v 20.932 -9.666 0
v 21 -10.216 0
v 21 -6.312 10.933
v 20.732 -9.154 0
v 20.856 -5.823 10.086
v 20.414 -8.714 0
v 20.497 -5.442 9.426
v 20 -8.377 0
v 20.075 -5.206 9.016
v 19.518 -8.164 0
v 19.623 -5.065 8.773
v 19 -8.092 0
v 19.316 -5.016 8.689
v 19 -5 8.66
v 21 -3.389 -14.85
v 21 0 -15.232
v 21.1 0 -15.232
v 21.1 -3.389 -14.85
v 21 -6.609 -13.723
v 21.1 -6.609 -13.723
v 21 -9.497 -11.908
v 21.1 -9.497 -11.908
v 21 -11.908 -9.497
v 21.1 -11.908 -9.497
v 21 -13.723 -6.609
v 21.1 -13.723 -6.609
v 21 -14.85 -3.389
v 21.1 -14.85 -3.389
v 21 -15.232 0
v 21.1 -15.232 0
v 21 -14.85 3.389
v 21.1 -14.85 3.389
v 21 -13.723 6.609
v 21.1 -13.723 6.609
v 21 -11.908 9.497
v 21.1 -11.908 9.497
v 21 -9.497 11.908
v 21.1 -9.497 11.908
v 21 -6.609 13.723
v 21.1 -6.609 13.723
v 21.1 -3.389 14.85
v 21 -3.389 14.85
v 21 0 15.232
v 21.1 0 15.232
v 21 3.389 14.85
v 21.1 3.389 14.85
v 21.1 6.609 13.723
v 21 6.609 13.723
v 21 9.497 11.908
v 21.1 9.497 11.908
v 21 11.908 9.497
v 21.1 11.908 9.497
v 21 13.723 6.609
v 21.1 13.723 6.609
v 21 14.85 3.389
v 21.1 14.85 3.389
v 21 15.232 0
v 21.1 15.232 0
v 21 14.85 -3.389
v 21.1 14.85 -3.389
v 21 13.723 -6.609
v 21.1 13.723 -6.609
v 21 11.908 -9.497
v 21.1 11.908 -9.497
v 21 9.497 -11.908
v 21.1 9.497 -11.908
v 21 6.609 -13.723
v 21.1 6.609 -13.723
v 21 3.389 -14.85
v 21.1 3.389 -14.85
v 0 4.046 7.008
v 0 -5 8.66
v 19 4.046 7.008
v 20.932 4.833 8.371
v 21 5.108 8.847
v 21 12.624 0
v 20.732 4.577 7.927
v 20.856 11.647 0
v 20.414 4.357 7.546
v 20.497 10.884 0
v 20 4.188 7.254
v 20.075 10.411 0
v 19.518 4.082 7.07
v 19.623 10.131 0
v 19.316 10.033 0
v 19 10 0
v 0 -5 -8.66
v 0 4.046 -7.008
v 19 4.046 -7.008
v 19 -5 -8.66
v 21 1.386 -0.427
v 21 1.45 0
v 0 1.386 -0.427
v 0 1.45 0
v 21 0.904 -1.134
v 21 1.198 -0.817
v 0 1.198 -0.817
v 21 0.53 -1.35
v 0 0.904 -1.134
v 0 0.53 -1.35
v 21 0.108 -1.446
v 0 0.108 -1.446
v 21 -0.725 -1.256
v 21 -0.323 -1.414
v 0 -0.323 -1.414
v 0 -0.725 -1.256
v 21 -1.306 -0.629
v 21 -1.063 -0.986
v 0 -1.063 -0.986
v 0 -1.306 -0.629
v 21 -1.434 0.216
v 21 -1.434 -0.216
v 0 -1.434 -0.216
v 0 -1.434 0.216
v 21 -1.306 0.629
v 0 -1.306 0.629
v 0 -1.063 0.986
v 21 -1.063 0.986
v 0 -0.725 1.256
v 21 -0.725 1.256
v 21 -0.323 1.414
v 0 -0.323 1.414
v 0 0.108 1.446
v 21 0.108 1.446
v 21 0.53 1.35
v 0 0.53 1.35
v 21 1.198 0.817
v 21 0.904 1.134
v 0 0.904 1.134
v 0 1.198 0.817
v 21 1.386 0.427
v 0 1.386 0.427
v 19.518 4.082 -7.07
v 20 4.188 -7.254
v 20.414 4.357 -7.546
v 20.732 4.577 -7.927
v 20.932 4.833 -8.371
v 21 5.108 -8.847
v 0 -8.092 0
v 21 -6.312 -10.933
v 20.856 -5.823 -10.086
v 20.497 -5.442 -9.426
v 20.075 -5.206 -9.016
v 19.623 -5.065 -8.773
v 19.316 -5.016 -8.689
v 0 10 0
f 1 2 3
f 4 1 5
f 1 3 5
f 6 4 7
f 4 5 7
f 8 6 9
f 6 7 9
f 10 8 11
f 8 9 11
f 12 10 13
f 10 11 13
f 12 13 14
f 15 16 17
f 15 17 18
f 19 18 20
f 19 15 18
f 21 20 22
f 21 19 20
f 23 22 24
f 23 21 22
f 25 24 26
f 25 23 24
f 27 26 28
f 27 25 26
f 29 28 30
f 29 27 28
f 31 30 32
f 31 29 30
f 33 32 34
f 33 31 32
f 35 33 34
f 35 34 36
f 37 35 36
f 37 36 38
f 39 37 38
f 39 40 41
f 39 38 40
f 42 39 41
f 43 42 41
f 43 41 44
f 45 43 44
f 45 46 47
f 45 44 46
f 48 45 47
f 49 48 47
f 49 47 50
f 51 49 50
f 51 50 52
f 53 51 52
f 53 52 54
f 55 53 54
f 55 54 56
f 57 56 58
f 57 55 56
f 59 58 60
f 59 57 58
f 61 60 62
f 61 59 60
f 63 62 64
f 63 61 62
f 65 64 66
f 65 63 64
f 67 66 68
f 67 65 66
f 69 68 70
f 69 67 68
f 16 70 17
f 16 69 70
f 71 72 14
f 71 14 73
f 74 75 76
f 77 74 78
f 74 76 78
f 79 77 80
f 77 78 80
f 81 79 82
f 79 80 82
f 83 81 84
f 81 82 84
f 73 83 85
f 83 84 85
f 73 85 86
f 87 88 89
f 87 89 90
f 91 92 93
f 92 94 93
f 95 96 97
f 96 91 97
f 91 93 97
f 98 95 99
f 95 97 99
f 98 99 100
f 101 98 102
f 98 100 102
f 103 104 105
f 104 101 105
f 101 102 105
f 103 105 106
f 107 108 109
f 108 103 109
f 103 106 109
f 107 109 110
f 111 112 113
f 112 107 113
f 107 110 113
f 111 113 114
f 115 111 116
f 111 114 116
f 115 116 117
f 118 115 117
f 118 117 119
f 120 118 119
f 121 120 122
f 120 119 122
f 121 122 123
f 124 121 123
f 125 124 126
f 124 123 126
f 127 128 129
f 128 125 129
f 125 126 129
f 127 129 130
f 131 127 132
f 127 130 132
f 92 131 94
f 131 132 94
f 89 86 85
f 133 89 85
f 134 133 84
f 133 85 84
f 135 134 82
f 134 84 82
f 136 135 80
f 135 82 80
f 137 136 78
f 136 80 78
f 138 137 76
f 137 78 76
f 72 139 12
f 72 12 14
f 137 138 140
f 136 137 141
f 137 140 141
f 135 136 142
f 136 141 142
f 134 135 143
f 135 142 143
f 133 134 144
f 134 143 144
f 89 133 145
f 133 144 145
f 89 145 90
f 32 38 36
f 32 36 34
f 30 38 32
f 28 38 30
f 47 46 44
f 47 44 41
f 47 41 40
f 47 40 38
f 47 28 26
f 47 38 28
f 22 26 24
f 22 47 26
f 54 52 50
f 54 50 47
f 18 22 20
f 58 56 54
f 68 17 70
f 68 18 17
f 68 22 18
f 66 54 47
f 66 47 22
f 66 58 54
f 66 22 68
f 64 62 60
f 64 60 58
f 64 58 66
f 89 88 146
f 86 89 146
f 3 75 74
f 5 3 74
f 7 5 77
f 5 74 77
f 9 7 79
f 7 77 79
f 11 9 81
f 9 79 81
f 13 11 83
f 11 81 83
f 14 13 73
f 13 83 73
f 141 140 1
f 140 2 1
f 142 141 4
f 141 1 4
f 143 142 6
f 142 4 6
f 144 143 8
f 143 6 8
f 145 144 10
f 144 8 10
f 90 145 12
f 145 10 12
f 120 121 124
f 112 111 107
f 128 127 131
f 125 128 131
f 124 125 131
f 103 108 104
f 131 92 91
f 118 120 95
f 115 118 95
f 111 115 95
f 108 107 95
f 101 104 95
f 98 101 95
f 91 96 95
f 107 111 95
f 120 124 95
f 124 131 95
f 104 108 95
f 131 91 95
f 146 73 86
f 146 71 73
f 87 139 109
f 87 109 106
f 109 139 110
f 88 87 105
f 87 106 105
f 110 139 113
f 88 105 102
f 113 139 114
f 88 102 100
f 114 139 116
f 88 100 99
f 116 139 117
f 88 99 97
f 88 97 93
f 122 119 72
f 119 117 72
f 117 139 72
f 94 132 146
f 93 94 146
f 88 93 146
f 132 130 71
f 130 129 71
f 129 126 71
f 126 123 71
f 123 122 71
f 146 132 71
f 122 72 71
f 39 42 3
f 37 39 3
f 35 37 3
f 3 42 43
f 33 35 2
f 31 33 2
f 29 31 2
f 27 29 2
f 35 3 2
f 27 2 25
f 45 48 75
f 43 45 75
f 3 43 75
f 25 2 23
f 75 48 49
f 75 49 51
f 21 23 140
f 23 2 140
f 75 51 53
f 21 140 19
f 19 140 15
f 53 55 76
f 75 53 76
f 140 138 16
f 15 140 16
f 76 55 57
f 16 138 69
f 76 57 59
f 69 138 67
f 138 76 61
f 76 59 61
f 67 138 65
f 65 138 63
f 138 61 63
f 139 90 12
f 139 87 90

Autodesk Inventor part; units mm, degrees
ref_plane "YZ Plane" through (0, 0, 0) normal (1, 0, 0) x (0, 1, 0)
ref_plane "XZ Plane" through (0, 0, 0) normal (0, 1, 0) x (-1, 0, 0)
ref_plane "XY Plane" through (0, 0, 0) normal (0, 0, 1) x (1, 0, 0)
sketch "Block1" plane through (0, 0, 0) normal (0, 0, 1) x (1, 0, 0)
  line L0 (4.046, 7.0078) -> (10, 0)
  line L1 (4.046, -7.0078) -> (10, 0)
  line L2 (4.046, -7.0078) -> (-5, -8.6603)
  line L3 (-5, -8.6603) -> (-8.092, 0)
  line L4 (-8.092, 0) -> (-5, 8.6603)
  line L5 (-5, 8.6603) -> (4.046, 7.0078)
  point P0 (0, 0)
sketch "Sketch1" plane through (0, 0, 0) normal (1, 0, 0) x (0, 1, 0)
  circle A0 centre (0, 0) radius 1.45
  line L0 (4.046, 7.0078) -> (10, 0)
  line L1 (4.046, -7.0078) -> (10, 0)
  line L2 (4.046, -7.0078) -> (-5, -8.6603)
  line L3 (-5, -8.6603) -> (-8.092, 0)
  line L4 (-8.092, 0) -> (-5, 8.6603)
  line L5 (-5, 8.6603) -> (4.046, 7.0078)
  point P0 (-0.5025, 0)
  point P1 (-0.5025, 0)
  dimension "d3" = 2.9
extrude "Extrusion1" add sketch "Sketch1" along normal blind 21
sketch "Sketch2" plane through (21, 0, 0) normal (1, 0, 0) x (0, 0, -1)
  circle A0 centre (0, 0) radius 15.2315
extrude "Extrusion2" add sketch "Sketch2" along normal blind 0.1
fillet "Fillet1" radius 2 6 edges at (21, 7.023, -3.5039) (21, 7.023, 3.5039) (21, -0.477, 7.834) (21, -6.546, 4.3301) (21, -6.546, -4.3301) (21, -0.477, -7.834)
properties part number "eje motor"
